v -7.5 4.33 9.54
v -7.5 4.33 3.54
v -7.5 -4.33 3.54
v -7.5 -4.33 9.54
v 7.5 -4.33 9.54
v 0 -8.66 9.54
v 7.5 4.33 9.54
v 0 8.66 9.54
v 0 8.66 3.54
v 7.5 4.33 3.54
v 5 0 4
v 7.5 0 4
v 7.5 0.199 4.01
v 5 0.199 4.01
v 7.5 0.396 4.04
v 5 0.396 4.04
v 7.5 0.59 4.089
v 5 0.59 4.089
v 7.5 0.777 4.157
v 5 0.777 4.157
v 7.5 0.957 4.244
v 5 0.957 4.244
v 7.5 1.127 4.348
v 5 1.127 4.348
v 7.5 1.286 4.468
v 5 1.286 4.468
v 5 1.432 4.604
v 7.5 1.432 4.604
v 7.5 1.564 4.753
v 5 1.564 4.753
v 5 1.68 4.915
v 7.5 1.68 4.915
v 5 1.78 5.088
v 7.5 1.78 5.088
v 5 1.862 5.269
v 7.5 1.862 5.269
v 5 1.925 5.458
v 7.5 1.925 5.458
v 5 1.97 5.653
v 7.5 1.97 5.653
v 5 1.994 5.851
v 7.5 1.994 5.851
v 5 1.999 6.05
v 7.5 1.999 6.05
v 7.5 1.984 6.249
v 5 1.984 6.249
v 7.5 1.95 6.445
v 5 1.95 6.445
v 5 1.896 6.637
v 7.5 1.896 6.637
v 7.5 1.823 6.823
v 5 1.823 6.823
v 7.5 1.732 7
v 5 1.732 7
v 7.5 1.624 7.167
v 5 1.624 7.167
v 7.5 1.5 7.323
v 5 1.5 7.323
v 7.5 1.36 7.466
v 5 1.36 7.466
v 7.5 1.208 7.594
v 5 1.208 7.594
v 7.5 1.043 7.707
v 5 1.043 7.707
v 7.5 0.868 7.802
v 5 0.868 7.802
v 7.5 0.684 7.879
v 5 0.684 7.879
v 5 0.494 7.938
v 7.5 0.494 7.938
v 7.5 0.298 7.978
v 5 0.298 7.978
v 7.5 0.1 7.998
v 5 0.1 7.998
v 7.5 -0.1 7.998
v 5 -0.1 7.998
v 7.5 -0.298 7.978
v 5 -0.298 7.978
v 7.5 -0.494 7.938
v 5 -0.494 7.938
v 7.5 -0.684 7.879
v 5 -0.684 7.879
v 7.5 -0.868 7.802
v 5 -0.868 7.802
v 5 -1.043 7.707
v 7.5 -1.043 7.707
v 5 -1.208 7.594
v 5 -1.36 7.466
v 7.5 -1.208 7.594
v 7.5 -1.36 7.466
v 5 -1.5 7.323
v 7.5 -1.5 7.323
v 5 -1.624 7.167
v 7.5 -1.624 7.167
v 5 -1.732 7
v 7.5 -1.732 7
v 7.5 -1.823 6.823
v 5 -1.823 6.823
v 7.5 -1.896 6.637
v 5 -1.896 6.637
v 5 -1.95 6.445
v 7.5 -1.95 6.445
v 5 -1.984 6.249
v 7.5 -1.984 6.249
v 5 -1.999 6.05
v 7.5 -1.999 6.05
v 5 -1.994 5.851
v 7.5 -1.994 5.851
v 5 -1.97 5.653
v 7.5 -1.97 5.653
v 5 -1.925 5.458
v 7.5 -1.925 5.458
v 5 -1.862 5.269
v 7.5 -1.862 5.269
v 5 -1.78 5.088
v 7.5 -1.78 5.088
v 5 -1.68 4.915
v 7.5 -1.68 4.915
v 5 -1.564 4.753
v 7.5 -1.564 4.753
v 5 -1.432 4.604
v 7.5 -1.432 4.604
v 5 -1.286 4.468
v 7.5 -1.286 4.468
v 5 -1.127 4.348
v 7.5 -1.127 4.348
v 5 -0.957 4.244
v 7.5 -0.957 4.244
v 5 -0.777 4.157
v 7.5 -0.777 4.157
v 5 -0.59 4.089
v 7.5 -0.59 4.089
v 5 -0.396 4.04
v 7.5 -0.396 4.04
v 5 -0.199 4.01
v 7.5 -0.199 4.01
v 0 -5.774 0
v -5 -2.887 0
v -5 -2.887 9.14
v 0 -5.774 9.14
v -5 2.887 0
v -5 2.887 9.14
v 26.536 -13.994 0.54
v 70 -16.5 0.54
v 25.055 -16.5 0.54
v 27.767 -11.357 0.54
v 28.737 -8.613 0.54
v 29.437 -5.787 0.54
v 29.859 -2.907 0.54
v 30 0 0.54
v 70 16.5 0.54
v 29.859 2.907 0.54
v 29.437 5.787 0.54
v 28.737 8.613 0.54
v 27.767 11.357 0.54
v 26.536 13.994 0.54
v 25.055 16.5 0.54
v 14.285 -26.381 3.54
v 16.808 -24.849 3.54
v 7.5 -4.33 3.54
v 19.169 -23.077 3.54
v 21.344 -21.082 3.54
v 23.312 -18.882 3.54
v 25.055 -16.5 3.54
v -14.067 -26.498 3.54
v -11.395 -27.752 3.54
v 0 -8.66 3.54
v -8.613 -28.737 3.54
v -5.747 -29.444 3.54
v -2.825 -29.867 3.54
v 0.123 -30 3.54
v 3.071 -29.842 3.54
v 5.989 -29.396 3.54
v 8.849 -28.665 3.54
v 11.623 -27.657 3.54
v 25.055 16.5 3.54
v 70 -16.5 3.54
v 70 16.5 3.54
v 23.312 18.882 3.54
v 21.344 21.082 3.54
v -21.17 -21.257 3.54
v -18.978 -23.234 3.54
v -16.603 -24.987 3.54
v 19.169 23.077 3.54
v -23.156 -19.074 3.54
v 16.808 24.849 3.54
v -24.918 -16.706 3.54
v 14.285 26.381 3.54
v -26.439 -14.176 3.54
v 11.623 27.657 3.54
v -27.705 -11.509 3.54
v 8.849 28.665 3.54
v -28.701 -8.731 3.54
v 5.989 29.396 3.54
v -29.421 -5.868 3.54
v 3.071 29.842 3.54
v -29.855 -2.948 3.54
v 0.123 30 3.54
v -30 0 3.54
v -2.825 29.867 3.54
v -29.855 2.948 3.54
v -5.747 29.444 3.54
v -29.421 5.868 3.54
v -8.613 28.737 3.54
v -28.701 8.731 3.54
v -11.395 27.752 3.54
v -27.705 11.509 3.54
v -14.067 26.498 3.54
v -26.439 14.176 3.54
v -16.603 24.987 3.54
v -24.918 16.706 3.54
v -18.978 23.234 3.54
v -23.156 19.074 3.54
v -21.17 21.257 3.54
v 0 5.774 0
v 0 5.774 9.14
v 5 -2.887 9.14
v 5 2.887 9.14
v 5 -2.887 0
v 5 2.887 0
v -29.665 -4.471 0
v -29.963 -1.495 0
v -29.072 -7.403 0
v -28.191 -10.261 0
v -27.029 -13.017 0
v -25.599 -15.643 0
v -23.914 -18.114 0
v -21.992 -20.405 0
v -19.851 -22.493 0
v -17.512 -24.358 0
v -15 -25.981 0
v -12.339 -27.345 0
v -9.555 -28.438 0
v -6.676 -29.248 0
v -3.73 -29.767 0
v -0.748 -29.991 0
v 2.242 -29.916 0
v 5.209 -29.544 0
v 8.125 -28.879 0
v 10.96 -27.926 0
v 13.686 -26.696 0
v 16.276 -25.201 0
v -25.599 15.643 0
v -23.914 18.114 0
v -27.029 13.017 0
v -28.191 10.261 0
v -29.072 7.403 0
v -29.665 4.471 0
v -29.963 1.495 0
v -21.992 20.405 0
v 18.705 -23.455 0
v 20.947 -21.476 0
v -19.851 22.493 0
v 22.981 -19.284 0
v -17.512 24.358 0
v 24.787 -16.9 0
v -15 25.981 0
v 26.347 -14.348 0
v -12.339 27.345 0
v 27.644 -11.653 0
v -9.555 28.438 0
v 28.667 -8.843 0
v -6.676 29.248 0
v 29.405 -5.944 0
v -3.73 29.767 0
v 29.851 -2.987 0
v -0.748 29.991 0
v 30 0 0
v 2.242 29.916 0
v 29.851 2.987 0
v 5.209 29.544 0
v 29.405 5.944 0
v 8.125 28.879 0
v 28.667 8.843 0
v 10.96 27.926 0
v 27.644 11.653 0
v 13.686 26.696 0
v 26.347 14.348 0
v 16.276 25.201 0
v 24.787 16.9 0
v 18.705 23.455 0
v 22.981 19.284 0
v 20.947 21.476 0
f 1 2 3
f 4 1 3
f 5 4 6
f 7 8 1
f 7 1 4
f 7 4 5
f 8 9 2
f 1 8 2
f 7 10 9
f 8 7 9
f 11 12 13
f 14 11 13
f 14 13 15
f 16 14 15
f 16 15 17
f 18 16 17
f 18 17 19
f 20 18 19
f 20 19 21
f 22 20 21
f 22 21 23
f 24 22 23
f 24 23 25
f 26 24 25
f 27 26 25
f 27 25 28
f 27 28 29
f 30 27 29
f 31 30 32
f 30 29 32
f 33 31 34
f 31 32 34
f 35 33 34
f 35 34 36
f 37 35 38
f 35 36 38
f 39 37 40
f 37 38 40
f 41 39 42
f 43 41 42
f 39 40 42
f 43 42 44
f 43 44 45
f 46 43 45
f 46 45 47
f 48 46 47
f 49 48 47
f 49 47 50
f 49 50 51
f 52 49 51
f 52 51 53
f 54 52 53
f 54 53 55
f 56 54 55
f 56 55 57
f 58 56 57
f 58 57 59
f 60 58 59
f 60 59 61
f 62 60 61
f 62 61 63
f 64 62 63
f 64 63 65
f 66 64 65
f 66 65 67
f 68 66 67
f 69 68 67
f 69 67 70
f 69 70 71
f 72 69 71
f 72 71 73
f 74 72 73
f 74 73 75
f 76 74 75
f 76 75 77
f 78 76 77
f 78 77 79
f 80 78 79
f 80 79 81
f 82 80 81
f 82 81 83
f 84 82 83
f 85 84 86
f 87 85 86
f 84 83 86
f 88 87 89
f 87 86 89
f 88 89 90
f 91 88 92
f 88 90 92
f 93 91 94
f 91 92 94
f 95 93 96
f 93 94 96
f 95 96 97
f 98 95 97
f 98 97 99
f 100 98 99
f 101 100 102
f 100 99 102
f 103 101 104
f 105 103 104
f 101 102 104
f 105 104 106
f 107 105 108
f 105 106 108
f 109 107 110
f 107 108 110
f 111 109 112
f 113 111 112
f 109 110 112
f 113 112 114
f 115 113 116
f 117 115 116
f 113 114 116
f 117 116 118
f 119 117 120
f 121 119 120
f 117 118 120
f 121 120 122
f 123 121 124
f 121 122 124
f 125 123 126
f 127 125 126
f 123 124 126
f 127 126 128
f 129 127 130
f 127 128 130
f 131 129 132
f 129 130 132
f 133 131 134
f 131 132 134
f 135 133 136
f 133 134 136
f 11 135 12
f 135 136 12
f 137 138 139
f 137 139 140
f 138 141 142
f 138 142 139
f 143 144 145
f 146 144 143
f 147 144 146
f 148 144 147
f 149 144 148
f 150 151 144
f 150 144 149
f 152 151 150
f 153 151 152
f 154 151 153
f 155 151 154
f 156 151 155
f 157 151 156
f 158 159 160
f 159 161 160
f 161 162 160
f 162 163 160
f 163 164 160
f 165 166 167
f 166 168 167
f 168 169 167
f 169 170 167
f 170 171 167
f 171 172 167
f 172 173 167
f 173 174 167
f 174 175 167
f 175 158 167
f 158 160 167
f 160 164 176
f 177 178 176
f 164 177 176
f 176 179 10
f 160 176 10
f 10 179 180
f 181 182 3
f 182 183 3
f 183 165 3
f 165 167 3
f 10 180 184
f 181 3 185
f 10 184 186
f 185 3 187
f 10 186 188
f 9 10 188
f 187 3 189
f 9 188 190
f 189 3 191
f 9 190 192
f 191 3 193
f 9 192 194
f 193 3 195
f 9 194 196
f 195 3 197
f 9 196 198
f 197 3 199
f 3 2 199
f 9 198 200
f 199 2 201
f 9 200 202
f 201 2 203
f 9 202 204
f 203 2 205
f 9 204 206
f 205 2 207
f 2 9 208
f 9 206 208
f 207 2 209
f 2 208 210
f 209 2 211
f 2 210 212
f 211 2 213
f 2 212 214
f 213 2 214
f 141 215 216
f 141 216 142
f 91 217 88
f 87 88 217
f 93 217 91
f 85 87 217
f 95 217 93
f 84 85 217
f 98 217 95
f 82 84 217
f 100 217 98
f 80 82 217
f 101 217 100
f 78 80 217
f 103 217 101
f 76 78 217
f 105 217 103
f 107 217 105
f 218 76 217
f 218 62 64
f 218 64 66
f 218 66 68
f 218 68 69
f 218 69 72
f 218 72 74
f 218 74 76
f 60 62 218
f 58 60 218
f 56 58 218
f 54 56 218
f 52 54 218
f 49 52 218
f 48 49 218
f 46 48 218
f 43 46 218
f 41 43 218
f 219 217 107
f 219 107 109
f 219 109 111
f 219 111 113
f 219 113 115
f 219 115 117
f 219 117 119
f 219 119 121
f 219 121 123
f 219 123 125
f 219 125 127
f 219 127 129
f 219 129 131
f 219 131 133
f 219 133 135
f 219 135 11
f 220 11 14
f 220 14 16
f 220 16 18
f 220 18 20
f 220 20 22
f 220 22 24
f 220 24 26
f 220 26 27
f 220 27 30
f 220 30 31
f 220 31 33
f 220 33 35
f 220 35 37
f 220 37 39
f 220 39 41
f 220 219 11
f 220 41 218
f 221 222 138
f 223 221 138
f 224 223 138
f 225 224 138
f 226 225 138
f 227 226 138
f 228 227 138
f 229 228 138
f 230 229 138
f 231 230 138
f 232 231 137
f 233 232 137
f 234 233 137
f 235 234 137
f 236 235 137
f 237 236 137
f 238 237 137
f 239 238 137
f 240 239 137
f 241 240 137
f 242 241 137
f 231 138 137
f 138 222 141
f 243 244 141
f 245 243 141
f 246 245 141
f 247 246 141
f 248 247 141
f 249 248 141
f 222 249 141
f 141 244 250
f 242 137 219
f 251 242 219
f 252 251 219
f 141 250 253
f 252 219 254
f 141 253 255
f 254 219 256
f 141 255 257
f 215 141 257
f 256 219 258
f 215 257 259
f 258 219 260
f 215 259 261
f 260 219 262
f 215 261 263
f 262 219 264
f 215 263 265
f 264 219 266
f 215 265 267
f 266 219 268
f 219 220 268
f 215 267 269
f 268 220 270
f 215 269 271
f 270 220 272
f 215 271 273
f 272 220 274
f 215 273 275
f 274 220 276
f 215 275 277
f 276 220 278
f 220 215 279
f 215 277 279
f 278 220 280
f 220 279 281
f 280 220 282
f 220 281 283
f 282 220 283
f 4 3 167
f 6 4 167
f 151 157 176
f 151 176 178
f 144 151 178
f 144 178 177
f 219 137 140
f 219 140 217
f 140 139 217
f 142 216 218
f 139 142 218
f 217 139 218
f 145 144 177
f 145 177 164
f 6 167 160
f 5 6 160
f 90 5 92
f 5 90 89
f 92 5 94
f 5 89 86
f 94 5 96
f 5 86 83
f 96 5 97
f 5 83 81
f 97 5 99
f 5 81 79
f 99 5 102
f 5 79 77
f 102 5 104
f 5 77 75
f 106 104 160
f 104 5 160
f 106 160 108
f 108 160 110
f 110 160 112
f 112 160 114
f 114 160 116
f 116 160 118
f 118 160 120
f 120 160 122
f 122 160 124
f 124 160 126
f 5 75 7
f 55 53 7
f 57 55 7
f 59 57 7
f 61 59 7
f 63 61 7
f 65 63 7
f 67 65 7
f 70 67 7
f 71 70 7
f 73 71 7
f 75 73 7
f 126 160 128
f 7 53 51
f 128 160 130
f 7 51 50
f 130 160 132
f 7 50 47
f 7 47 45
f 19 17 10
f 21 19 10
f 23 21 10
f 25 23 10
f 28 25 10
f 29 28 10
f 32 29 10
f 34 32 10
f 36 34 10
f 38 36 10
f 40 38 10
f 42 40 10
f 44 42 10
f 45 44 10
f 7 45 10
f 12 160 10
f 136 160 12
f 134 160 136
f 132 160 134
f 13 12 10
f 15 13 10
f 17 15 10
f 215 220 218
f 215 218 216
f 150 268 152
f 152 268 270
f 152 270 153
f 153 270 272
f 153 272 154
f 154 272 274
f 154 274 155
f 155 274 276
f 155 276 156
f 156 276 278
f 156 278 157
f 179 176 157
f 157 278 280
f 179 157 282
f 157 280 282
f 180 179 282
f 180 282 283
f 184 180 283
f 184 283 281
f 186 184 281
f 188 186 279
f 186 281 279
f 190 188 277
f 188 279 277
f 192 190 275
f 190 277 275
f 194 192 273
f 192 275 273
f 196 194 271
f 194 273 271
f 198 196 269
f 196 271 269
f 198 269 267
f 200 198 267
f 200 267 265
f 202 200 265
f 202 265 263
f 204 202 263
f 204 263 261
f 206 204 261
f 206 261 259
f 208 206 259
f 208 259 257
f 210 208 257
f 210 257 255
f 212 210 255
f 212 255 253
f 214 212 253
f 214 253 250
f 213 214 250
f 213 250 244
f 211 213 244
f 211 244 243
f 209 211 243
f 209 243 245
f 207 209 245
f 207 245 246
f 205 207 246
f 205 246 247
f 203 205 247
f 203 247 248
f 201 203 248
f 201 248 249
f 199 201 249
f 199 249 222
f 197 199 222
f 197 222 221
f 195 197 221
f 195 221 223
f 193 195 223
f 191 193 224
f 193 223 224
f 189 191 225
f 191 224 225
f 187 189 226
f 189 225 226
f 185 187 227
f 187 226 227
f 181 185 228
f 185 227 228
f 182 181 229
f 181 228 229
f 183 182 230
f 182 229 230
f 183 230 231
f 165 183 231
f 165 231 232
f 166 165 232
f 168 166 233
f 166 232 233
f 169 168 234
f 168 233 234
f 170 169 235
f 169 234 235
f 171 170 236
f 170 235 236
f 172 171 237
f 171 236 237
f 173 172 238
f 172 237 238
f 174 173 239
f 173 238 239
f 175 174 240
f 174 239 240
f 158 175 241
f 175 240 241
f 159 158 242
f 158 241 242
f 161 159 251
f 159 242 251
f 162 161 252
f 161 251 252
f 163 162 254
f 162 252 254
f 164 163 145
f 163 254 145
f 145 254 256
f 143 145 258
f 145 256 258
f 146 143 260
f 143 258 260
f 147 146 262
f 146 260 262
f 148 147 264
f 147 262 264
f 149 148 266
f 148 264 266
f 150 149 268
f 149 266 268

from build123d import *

# Parameters (mm, degrees)
SKETCH1_R           = 30
BOSS_EXTRUDE1_DEPTH = 3.54
BOSS_EXTRUDE4_START = -3
BOSS_EXTRUDE4_DEPTH = 3
CUT_EXTRUDE3_DEPTH  = 6
BOSS_EXTRUDE5_DEPTH = 6
BOSS_EXTRUDE6_DEPTH = 0.4
CUT_EXTRUDE4_REACH  = 71.98
SKETCH12_R          = 2


with BuildPart() as part:
    # Sketch1 → Boss-Extrude1 (new body)
    with BuildSketch(Plane.XY):
        Circle(SKETCH1_R)
    extrude(amount=BOSS_EXTRUDE1_DEPTH)

    # Sketch4 → Boss-Extrude4 (add)
    with BuildSketch(Plane.XY.offset(3.54).offset(BOSS_EXTRUDE4_START)):
        with BuildLine():
            Line((25.054939633, 16.5), (70, 16.5))
            Line((70, 16.5), (70, -16.5))
            Line((70, -16.5), (25.054939633, -16.5))
            ThreePointArc((25.054939633, -16.5), (30, 0), (25.054939633, 16.5))
        make_face()
    extrude(amount=BOSS_EXTRUDE4_DEPTH)

    # Sketch9 → Cut-Extrude3 (cut)
    with BuildSketch(Plane(origin=(0, 0, 0), x_dir=(-1, 0, 0), z_dir=(0, 0, -1))):
        Polygon((0, 5.773502692), (-5, 2.886751346), (-5, -2.886751346), (0, -5.773502692), (5, -2.886751346), (5, 2.886751346), align=None)
    extrude(amount=-CUT_EXTRUDE3_DEPTH, mode=Mode.SUBTRACT)

    # Sketch10 → Boss-Extrude5 (add)
    with BuildSketch(Plane.XY.offset(3.54)):
        Polygon((0, 8.660254038), (-7.5, 4.330127019), (-7.5, -4.330127019), (0, -8.660254038), (7.5, -4.330127019), (7.5, 4.330127019), align=None)
        Polygon((0, 5.773502692), (-5, 2.886751346), (-5, -2.886751346), (0, -5.773502692), (5, -2.886751346), (5, 2.886751346), align=None, mode=Mode.SUBTRACT)
    extrude(amount=BOSS_EXTRUDE5_DEPTH)

    # Sketch11 → Boss-Extrude6 (add)
    with BuildSketch(Plane.XY.offset(9.54)):
        Polygon((0, 5.773502692), (-5, 2.886751346), (-5, -2.886751346), (0, -5.773502692), (5, -2.886751346), (5, 2.886751346), align=None)
    extrude(amount=-BOSS_EXTRUDE6_DEPTH)

    # Sketch12 → Cut-Extrude4 (cut, up to next)
    with BuildSketch(Plane(origin=(7.5, 0, 0), x_dir=(0, 0, -1), z_dir=(1, 0, 0)), mode=Mode.PRIVATE) as cut_extrude4_sk1:
        with Locations((-6, 0)):
            Circle(SKETCH12_R)
    cut_extrude4_tool1 = extrude(cut_extrude4_sk1.sketch, amount=-CUT_EXTRUDE4_REACH, mode=Mode.PRIVATE) & part.part
    add(cut_extrude4_tool1.solids().sort_by_distance((7.5, 0, 6))[0], mode=Mode.SUBTRACT)


solid = part.part
